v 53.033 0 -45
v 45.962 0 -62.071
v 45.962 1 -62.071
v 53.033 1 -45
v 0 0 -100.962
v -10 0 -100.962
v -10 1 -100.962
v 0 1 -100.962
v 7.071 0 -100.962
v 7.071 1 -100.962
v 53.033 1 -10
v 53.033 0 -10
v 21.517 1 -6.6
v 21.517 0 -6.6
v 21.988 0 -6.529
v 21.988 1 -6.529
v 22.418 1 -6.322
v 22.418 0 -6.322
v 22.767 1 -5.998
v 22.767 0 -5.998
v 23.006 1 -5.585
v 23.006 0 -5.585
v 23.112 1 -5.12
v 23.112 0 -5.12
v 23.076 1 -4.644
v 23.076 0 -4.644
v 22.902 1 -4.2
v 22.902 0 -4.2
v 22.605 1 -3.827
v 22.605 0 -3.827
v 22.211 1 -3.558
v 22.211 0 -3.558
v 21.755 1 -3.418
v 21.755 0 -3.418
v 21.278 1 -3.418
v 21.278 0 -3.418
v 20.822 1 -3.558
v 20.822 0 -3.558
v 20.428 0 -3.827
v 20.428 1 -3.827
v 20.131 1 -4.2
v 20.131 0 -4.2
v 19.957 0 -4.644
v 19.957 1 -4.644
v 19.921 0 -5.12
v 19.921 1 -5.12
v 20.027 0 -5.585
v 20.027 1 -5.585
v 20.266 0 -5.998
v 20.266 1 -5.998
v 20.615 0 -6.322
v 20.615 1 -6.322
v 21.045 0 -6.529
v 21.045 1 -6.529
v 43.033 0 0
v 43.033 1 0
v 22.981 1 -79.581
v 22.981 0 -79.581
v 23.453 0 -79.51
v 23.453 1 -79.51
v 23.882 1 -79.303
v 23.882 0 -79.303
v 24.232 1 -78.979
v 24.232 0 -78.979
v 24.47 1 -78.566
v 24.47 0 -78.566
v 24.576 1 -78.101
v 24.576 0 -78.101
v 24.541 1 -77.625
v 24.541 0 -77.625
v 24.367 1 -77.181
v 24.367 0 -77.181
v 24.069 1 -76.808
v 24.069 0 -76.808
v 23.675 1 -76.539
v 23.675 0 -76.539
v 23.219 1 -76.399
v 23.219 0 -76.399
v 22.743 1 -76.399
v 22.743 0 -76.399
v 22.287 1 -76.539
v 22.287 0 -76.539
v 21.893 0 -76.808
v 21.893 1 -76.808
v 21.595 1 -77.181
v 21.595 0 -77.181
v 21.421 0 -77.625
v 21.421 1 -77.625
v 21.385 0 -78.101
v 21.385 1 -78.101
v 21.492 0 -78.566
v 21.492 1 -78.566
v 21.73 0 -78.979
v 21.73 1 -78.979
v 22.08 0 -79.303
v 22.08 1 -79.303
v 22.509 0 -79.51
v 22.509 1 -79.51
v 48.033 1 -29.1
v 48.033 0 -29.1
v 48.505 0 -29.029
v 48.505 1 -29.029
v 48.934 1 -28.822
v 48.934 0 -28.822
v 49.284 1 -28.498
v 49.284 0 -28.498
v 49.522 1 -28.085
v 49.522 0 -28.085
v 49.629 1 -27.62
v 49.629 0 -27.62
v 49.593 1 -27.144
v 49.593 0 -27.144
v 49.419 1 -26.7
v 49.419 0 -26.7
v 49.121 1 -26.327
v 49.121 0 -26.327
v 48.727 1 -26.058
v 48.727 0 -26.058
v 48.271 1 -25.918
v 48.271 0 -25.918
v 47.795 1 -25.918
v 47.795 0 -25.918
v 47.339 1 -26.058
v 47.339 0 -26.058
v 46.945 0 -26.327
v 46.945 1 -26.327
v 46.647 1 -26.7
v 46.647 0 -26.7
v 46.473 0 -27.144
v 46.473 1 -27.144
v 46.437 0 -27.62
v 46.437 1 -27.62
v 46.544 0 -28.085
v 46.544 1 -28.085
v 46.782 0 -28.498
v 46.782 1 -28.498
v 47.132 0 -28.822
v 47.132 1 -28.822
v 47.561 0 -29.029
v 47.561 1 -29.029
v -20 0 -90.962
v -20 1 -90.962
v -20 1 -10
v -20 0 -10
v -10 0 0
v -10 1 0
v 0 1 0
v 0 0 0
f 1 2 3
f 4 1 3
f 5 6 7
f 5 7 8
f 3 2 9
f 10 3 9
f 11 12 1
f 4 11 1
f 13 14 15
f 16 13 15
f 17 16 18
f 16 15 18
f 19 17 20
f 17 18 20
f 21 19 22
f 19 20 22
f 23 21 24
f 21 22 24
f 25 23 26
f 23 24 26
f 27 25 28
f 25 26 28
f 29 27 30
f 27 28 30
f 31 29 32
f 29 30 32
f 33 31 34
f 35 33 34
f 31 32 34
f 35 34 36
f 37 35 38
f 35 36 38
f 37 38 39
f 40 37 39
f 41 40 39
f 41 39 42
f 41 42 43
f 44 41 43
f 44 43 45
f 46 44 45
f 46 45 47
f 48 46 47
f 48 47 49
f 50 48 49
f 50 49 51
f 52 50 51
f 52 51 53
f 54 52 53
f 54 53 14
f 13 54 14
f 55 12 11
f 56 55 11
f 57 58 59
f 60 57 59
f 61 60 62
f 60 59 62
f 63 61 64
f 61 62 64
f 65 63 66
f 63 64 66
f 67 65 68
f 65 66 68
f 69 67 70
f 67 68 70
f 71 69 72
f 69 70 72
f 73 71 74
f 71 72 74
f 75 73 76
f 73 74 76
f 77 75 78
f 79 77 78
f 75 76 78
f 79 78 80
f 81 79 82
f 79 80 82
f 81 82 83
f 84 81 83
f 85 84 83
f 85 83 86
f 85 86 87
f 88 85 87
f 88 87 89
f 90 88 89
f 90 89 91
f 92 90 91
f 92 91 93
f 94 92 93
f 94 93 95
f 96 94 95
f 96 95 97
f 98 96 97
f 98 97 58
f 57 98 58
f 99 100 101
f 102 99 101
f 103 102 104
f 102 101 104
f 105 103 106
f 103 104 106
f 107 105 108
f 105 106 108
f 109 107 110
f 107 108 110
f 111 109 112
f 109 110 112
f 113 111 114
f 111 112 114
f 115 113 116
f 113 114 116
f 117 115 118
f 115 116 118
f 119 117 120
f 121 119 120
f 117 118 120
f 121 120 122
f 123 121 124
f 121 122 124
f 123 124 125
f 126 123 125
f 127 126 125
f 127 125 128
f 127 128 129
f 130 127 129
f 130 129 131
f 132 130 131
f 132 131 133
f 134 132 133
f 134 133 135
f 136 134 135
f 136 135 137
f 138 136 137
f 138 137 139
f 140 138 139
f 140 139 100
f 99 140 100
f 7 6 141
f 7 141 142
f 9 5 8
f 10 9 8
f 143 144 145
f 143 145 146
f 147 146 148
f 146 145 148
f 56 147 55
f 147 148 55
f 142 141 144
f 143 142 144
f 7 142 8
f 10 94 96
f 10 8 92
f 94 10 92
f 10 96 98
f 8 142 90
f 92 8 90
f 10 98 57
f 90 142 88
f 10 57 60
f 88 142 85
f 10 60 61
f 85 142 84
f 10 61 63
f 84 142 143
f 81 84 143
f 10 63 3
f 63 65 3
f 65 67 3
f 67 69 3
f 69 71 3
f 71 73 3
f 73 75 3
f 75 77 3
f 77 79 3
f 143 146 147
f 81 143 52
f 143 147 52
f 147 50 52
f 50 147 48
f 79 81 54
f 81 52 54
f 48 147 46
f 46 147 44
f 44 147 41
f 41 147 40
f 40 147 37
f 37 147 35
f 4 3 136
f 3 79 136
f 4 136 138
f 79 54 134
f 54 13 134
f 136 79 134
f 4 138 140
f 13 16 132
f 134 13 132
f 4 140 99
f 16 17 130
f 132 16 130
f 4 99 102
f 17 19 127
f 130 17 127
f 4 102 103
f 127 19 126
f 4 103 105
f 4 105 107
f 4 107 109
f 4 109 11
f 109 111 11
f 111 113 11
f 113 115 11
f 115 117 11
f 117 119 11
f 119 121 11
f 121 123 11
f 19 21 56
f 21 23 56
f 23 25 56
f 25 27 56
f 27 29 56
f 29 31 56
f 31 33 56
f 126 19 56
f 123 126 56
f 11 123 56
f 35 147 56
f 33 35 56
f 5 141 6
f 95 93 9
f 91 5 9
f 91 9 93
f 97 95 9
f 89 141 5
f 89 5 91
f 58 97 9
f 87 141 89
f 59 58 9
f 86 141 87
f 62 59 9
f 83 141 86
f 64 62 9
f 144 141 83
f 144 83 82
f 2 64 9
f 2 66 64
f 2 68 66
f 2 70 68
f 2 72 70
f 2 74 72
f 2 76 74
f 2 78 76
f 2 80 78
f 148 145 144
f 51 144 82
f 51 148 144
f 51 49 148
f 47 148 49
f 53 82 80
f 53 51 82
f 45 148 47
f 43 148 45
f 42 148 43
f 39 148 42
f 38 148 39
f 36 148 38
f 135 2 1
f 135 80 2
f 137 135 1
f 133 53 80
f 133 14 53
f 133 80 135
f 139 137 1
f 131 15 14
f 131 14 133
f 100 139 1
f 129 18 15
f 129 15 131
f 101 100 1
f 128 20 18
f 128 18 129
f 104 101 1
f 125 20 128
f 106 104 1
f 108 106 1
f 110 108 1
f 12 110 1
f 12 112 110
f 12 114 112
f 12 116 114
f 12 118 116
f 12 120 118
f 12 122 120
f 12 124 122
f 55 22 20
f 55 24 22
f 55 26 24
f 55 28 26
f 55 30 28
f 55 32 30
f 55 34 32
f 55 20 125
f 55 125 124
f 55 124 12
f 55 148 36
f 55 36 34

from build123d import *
from OCP.BRepFilletAPI import BRepFilletAPI_MakeChamfer

# Parameters (mm, degrees)
EXTRUDE_1_DEPTH     = 1
CHAMFER_1_SIZE      = 10
CHAMFER_1_SIZE2     = 7.071067812
CHAMFER_2_SIZE      = 10
SKETCH_3_R          = 1.6
CUT_EXTRUDE_2_DEPTH = 10
SKETCH_4_W          = 20
SKETCH_4_H          = 100.961940777
EXTRUDE_2_DEPTH     = 1
CHAMFER_3_SIZE      = 10


with BuildPart() as part:
    # 草图1 → 凸台-拉伸1 (new body)
    with BuildSketch(Plane(origin=(0, 0, 0), x_dir=(1, 0, 0), z_dir=(0, 1, 0))):
        Polygon((0, 0), (53.033008589, 0), (53.033008589, 55), (0, 108.033008589), align=None)
    extrude(amount=EXTRUDE_1_DEPTH)

    # 倒角1: one chamfer whose edges measure the first distance from different faces: ONE call of the kernel's chamfer builder (chamfer() names one face for all edges)
    chamfer_1_edges_1 = [part.edges().sort_by_distance(p)[0] for p in [
        (0, 0.5, -108.033008589),
    ]]
    chamfer_1_side_1 = [part.faces().sort_by_distance(p)[0] for p in [
        (26.516504294, 0.5, -81.516504294),
    ]]
    chamfer_1_edges_2 = [part.edges().sort_by_distance(p)[0] for p in [
        (53.033008589, 0.5, 0),
    ]]
    chamfer_1 = BRepFilletAPI_MakeChamfer(part.part.solid().wrapped)
    for e in chamfer_1_edges_1:
        chamfer_1.Add(CHAMFER_1_SIZE, CHAMFER_1_SIZE2, e.wrapped, chamfer_1_side_1[0].wrapped)  # the first distance lies on this face
    for e in chamfer_1_edges_2:
        chamfer_1.Add(CHAMFER_1_SIZE, e.wrapped)
    add(Compound.cast(chamfer_1.Shape()), mode=Mode.REPLACE)

    # 倒角2
    chamfer_2_edges = [part.edges().sort_by_distance(p)[0] for p in [
        (53.033008589, 0.5, -55),
    ]]
    chamfer(chamfer_2_edges, length=CHAMFER_2_SIZE)

    # 草图3 → 切除-拉伸2 (cut)
    with BuildSketch(Plane.XZ):
        with Locations(Location((22.980970389, -77.980970389, 0), (0, 0, 270))):
            Circle(SKETCH_3_R)
        with Locations(Location((48.033008589, -27.5, 0), (0, 0, 270))):
            Circle(SKETCH_3_R)
        with Locations(Location((21.516504294, -5, 0), (0, 0, 270))):
            Circle(SKETCH_3_R)
    extrude(amount=-CUT_EXTRUDE_2_DEPTH, mode=Mode.SUBTRACT)

    # 草图4 → 凸台-拉伸2 (add)
    with BuildSketch(Plane.XZ):
        with Locations((-10, -50.480970389)):
            Rectangle(SKETCH_4_W, SKETCH_4_H)
    extrude(amount=-EXTRUDE_2_DEPTH)

    # 倒角3
    chamfer_3_edges = [part.edges().sort_by_distance(p)[0] for p in [
        (-20, 0.5, 0),
        (-20, 0.5, -100.961940777),
    ]]
    chamfer(chamfer_3_edges, length=CHAMFER_3_SIZE)


solid = part.part
